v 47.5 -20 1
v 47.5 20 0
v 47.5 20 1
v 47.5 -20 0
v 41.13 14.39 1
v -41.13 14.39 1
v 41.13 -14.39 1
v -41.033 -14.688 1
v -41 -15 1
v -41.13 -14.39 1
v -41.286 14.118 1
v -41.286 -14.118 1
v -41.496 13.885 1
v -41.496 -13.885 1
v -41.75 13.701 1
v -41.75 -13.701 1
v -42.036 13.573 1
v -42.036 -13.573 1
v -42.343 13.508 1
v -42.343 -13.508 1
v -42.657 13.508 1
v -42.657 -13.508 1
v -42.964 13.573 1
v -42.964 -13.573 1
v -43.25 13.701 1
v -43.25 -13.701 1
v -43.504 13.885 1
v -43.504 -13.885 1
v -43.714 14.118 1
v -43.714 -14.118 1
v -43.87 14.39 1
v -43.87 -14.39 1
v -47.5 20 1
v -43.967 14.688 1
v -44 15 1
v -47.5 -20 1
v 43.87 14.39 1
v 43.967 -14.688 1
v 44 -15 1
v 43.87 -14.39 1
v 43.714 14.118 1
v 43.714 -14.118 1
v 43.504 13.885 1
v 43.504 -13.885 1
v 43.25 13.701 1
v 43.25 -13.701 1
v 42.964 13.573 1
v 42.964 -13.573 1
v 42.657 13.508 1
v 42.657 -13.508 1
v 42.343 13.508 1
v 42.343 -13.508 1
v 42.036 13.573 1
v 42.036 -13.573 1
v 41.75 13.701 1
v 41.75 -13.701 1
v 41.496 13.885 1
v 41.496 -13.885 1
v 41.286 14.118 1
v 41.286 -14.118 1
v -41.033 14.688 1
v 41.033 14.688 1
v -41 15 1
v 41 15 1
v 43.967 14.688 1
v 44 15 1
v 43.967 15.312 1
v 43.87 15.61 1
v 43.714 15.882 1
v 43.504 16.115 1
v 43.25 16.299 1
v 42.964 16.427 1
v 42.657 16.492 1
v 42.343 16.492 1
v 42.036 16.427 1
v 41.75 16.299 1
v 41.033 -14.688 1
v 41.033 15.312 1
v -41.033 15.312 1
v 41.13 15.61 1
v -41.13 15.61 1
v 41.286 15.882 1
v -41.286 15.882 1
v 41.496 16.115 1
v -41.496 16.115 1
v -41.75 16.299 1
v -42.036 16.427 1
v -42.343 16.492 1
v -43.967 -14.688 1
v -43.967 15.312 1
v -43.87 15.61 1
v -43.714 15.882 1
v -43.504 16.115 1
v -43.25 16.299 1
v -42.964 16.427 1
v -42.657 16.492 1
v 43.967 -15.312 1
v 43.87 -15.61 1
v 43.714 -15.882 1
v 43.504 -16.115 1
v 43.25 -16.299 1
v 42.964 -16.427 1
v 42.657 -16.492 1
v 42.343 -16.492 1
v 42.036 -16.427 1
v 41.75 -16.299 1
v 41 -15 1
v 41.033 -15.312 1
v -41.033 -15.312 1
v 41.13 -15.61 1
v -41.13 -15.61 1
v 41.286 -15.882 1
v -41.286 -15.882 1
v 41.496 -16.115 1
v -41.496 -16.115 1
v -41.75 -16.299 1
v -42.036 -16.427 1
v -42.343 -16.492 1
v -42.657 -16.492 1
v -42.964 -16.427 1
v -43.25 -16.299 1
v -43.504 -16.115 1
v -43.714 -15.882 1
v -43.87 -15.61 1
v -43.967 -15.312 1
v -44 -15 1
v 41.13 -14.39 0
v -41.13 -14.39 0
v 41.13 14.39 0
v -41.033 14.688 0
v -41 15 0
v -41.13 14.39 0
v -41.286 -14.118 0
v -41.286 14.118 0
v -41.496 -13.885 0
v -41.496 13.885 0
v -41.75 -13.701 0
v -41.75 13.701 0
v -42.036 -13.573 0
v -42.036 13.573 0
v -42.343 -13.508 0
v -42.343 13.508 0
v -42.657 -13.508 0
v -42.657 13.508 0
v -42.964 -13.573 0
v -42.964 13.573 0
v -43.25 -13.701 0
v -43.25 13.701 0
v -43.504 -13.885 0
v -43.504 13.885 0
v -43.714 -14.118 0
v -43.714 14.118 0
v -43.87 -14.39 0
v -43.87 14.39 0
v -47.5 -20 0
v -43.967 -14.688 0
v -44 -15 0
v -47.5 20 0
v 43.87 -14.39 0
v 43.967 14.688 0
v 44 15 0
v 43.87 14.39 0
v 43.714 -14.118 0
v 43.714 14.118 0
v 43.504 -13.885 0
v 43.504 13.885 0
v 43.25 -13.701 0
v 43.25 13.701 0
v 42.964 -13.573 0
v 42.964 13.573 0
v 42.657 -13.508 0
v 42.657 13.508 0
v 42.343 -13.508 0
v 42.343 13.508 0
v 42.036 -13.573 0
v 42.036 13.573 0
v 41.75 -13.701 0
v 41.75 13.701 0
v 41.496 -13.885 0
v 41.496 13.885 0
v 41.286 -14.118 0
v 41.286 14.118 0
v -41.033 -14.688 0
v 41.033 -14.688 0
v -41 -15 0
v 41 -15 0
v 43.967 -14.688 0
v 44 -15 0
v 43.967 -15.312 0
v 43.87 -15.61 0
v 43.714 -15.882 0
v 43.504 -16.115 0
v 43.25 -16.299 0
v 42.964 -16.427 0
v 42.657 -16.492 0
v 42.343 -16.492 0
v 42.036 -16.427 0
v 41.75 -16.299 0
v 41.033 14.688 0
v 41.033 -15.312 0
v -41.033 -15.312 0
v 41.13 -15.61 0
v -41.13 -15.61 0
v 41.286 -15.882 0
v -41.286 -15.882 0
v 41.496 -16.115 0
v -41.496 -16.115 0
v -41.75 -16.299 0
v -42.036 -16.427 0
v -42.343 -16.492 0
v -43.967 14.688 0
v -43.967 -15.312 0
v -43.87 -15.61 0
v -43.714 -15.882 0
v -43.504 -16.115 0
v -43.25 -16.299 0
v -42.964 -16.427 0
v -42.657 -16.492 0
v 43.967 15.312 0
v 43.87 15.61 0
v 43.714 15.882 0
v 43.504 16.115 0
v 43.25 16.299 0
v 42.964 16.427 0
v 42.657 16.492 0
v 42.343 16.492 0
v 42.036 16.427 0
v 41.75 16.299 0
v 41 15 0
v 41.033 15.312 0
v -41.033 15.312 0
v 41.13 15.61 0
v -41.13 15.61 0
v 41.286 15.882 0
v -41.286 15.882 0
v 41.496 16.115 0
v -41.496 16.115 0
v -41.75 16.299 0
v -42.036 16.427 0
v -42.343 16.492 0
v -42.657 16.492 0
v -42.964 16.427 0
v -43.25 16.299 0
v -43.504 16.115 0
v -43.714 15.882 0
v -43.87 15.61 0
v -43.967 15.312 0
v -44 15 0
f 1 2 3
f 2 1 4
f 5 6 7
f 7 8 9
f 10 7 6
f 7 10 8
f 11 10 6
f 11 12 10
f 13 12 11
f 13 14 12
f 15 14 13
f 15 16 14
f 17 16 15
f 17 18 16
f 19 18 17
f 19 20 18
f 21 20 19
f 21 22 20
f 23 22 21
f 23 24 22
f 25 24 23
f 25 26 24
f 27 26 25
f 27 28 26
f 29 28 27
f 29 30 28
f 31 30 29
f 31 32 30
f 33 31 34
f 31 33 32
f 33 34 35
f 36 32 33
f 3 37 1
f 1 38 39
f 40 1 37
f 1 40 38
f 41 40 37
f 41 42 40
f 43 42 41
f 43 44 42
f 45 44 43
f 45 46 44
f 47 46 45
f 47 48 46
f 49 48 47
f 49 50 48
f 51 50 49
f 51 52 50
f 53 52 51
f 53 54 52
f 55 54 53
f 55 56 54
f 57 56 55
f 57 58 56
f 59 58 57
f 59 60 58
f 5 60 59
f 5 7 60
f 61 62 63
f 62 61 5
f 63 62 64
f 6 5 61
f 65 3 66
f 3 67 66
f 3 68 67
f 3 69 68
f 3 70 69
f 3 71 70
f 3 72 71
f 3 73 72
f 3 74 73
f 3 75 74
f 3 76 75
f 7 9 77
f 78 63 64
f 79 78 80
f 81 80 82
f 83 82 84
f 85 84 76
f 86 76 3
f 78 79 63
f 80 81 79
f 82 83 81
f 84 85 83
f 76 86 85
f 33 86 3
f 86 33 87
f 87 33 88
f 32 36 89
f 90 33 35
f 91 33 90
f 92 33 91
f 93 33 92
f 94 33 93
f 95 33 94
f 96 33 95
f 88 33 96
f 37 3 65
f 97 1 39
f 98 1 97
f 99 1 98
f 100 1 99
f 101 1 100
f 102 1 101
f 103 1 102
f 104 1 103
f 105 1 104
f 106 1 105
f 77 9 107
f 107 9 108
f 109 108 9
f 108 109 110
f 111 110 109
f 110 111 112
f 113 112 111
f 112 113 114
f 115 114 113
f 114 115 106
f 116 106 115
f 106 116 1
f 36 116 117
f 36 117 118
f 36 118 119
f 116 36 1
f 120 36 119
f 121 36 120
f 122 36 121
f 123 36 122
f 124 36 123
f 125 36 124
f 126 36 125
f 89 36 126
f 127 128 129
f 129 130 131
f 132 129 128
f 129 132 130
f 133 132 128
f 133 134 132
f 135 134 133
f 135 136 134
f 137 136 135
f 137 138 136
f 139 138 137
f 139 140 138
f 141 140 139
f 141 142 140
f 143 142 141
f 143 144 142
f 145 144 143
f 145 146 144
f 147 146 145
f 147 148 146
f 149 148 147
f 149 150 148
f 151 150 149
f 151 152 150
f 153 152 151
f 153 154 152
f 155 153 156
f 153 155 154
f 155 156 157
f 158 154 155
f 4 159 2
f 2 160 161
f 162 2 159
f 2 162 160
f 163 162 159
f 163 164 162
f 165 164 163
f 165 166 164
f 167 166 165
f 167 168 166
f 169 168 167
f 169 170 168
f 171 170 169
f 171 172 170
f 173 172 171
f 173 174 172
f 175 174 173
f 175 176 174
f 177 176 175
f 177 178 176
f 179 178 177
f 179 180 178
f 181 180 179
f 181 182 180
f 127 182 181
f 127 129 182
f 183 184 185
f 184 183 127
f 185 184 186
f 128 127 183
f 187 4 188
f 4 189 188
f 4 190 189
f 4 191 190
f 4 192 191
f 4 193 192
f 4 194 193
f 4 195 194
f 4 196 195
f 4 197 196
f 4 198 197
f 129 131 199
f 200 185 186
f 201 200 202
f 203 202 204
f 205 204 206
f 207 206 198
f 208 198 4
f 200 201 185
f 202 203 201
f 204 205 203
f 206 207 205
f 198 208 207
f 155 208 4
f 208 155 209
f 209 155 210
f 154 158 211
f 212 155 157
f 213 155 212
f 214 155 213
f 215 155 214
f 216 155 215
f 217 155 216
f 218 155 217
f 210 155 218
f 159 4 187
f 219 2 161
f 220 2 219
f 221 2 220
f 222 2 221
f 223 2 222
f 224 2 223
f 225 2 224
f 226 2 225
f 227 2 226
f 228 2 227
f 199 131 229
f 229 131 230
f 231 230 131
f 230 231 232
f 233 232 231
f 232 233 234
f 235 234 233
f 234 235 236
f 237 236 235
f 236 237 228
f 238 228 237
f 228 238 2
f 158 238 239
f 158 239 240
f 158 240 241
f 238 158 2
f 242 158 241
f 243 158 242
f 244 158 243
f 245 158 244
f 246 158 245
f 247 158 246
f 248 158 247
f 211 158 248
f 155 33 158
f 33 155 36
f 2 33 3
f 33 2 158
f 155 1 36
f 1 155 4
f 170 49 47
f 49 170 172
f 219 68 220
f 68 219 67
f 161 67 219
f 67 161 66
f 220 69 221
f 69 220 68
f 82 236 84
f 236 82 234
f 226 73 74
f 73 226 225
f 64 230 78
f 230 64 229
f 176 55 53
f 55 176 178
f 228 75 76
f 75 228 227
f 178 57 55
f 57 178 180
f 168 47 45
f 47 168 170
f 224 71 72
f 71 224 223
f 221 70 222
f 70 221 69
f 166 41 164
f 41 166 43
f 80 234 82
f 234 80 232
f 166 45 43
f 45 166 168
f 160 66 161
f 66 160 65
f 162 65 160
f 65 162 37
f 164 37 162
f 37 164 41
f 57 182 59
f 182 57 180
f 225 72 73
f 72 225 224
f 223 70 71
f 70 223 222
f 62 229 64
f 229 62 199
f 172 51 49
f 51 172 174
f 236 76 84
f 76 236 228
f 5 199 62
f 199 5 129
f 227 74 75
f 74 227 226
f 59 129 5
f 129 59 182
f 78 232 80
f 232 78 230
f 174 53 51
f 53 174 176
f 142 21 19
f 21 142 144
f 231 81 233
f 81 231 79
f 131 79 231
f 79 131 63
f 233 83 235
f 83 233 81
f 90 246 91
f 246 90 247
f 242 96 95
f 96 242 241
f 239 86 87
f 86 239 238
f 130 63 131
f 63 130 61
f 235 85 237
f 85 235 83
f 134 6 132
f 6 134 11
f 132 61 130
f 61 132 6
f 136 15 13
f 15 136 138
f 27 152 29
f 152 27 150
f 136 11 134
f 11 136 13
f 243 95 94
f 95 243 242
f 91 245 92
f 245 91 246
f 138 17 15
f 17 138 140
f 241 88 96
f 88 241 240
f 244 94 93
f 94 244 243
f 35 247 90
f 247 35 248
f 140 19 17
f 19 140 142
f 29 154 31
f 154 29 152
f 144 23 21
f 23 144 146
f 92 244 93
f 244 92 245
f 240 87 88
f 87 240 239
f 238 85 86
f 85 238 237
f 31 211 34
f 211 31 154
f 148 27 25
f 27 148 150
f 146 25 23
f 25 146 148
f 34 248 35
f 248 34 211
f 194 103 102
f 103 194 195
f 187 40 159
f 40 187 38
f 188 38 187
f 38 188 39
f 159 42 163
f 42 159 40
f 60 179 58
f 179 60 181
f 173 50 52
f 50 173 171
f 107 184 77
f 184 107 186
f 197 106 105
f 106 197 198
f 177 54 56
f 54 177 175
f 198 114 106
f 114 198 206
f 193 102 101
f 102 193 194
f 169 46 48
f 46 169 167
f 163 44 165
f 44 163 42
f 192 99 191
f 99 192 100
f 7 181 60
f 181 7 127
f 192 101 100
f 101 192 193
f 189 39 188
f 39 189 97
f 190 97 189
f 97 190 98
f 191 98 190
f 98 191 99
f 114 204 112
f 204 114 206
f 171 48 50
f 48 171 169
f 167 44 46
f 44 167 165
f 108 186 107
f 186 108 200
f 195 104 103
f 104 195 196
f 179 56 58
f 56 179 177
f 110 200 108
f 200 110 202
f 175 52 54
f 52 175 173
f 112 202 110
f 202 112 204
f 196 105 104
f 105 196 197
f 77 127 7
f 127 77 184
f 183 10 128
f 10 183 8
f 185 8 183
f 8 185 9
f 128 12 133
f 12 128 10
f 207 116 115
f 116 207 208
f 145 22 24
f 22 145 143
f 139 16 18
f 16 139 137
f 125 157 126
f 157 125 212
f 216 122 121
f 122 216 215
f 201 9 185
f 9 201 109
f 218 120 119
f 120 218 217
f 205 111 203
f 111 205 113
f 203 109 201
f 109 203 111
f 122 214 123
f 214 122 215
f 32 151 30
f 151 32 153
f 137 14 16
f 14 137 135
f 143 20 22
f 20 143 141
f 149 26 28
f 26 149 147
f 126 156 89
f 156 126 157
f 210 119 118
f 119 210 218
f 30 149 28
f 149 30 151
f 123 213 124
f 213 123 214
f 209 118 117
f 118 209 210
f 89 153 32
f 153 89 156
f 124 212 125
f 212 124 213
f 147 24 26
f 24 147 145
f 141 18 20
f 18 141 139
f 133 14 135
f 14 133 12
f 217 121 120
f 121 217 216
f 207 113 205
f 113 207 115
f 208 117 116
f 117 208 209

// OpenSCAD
w=95;
h=40;
thickness=1;

rim_thickness = 0.6;

module rim(w=240, h=100, thickness=1) {
    color("black")
    translate([0, 0, thickness + rim_thickness/2]) {
        difference() {
            cube([
                w - 1, h - 1, rim_thickness
            ], center=true);

            cube([
                w - 1 - 4, h - 1 - 4, 2
            ], center=true);
        }
    }
}

module plate(w=240, h=100, thickness=1) {
    
    hole_distance = 5;
    hole_w = w/2 - hole_distance;
    hole_h = h/2 - hole_distance;
    
    difference() {
        translate([0, 0, thickness/2])
        cube([w, h, thickness], center=true);

        translate([hole_w, hole_h,0])
        cylinder(d=3, h=thickness + 1, $fn=30);

        translate([-hole_w, hole_h, 0])
        cylinder(d=3, h=thickness + 1, $fn=30);

        translate([hole_w, -hole_h,0])
        cylinder(d=3, h=thickness + 1, $fn=30);

        translate([-hole_w, -hole_h, 0])
        cylinder(d=3, h=thickness + 1, $fn=30);
    }


}

module main_text() {
    translate([0, 0, thickness])
    color("black") {
        linear_extrude(height=1)
            text(
                text="3DPrinting",
                halign="center",
                valign="center",
                size=14
            );
    }
}

plate(w=w, h=h, thickness=thickness);
//rim(w=w, h=h, thickness=thickness);
//main_text();
